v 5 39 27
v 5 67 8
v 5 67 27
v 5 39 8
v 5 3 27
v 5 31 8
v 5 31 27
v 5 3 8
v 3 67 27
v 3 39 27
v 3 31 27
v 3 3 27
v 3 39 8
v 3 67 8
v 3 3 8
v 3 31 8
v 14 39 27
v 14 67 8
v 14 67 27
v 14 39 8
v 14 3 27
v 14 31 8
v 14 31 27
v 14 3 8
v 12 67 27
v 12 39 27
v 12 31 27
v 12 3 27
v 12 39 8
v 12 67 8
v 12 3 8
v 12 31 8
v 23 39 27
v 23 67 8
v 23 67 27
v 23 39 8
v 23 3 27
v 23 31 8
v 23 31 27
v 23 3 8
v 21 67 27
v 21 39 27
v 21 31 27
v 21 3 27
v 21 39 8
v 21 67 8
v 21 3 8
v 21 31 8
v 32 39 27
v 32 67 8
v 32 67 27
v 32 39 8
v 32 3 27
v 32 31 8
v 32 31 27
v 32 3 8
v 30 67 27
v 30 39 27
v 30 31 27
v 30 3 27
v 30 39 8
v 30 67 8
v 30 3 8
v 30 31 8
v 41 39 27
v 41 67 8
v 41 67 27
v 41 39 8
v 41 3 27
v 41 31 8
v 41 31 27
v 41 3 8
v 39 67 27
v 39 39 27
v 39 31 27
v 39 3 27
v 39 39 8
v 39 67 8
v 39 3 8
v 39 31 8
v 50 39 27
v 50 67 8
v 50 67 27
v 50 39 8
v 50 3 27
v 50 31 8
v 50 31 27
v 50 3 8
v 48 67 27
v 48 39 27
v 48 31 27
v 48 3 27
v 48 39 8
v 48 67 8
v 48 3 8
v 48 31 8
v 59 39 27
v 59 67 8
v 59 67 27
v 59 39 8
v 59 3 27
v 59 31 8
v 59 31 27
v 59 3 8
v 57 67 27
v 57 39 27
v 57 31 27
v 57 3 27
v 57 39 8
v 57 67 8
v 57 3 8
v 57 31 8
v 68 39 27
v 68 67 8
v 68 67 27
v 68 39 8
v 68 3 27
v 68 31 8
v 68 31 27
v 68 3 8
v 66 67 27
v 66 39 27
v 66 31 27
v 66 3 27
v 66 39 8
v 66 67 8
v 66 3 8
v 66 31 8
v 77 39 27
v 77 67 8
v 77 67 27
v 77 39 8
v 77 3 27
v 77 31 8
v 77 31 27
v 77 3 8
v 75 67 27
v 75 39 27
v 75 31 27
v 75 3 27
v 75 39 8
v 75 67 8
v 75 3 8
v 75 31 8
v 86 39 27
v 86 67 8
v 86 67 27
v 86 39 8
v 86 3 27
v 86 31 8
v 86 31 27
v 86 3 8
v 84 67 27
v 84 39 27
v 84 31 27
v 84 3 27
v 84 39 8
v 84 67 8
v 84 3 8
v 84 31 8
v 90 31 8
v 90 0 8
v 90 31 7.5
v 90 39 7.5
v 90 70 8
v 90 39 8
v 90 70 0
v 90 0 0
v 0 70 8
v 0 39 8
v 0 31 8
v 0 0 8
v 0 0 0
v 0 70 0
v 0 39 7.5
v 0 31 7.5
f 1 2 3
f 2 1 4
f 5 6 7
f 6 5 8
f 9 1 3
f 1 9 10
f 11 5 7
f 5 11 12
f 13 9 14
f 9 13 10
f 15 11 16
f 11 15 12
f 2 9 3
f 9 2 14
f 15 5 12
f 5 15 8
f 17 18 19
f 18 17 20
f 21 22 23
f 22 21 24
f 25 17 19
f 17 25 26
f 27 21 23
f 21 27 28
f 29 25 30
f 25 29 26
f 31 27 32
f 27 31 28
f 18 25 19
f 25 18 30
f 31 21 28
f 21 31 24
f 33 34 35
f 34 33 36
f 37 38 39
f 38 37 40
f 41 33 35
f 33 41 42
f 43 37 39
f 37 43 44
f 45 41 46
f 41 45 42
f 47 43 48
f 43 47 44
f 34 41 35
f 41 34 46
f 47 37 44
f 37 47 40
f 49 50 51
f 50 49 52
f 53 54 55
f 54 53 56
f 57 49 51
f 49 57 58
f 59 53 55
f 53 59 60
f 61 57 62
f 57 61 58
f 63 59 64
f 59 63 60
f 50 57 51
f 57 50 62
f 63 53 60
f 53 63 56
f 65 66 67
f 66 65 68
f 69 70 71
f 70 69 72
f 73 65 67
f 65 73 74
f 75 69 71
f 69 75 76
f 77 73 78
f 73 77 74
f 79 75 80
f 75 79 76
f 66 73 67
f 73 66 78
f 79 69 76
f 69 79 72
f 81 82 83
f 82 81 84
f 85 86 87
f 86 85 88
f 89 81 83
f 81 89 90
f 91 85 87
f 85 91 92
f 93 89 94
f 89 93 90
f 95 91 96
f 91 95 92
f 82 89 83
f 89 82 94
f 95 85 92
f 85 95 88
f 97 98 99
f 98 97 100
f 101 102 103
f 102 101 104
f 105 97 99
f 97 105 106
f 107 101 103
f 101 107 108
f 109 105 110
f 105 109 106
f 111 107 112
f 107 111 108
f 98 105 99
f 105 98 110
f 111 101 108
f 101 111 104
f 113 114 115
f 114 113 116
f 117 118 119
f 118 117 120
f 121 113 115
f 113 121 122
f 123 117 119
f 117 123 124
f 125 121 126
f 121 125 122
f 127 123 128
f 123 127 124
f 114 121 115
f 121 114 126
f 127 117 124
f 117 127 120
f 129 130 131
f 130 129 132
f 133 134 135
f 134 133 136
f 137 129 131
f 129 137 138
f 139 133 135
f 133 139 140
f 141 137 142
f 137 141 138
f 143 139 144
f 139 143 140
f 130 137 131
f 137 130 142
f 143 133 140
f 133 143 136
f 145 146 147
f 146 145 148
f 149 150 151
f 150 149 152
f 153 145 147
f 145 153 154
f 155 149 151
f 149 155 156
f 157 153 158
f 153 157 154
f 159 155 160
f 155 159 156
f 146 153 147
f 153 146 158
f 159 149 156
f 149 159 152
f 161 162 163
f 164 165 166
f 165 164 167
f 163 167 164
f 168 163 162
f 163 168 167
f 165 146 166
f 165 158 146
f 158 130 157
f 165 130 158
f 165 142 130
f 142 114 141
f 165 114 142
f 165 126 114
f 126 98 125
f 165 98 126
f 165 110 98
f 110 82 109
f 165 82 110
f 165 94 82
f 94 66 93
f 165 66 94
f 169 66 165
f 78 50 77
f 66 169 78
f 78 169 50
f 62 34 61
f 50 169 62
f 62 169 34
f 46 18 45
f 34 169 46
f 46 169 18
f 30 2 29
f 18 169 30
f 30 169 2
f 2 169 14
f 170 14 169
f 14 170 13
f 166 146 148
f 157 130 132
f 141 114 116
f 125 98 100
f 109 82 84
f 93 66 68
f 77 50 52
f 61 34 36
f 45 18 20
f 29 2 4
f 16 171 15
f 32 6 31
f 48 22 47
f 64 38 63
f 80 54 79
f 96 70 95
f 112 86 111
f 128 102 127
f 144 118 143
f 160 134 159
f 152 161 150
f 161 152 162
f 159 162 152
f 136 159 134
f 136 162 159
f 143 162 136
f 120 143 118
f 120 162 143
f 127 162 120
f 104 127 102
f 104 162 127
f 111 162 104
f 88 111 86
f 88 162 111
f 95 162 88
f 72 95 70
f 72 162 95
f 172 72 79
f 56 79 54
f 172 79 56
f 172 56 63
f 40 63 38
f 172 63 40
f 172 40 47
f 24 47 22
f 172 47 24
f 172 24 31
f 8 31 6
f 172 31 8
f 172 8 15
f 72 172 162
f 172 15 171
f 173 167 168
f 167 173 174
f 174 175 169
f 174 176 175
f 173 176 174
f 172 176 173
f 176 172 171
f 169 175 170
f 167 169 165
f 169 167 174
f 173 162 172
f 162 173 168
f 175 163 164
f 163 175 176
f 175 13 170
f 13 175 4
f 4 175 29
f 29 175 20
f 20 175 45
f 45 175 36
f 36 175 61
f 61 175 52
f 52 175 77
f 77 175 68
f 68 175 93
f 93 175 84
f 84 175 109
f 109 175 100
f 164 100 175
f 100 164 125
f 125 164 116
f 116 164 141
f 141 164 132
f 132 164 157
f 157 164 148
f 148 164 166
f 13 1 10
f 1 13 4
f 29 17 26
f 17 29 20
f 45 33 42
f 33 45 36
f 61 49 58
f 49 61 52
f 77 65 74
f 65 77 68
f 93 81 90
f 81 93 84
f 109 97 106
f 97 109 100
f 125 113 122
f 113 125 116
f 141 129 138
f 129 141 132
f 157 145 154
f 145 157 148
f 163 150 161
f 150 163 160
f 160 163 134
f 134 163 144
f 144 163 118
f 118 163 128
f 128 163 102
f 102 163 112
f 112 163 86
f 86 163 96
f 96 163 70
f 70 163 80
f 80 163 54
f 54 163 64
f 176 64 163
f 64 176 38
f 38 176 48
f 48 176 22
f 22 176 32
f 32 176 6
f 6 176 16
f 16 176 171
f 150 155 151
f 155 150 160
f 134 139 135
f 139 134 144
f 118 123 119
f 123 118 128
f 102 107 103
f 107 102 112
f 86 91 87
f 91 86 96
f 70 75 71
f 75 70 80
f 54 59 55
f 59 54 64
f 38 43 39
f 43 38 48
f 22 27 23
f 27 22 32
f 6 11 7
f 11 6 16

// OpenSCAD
$fn = 32;

// ----------------------------------------------------------------------
// Heatsink: slotted fin block
// ----------------------------------------------------------------------

// --- parameters (mm) ---
base_l = 90;              // base length, X
base_w = 70;              // base width, Y
base_t = 8;               // base plate thickness
fin_h = 20;               // fin height above the base
fin_t = 2;                // fin thickness
edge = 3;                 // margin from the base ends
pitch = 9;                // fin pitch
slot_w = 8;               // central slot width, Y

n_fins = floor((base_l - 2 * edge - fin_t) / pitch) + 1;  // fin count
total_h = base_t + fin_h - 1;  // overall height

difference() {
union() {
  cube([base_l, base_w, base_t]);
  for (i = [0 : n_fins - 1])
    translate([edge + i * pitch, edge, base_t - 1])
      cube([fin_t, base_w - 2 * edge, fin_h]);
}
  translate([-1, base_w / 2 - slot_w / 2, base_t - 0.5])
    cube([base_l + 2, slot_w, fin_h + 2]);
}
